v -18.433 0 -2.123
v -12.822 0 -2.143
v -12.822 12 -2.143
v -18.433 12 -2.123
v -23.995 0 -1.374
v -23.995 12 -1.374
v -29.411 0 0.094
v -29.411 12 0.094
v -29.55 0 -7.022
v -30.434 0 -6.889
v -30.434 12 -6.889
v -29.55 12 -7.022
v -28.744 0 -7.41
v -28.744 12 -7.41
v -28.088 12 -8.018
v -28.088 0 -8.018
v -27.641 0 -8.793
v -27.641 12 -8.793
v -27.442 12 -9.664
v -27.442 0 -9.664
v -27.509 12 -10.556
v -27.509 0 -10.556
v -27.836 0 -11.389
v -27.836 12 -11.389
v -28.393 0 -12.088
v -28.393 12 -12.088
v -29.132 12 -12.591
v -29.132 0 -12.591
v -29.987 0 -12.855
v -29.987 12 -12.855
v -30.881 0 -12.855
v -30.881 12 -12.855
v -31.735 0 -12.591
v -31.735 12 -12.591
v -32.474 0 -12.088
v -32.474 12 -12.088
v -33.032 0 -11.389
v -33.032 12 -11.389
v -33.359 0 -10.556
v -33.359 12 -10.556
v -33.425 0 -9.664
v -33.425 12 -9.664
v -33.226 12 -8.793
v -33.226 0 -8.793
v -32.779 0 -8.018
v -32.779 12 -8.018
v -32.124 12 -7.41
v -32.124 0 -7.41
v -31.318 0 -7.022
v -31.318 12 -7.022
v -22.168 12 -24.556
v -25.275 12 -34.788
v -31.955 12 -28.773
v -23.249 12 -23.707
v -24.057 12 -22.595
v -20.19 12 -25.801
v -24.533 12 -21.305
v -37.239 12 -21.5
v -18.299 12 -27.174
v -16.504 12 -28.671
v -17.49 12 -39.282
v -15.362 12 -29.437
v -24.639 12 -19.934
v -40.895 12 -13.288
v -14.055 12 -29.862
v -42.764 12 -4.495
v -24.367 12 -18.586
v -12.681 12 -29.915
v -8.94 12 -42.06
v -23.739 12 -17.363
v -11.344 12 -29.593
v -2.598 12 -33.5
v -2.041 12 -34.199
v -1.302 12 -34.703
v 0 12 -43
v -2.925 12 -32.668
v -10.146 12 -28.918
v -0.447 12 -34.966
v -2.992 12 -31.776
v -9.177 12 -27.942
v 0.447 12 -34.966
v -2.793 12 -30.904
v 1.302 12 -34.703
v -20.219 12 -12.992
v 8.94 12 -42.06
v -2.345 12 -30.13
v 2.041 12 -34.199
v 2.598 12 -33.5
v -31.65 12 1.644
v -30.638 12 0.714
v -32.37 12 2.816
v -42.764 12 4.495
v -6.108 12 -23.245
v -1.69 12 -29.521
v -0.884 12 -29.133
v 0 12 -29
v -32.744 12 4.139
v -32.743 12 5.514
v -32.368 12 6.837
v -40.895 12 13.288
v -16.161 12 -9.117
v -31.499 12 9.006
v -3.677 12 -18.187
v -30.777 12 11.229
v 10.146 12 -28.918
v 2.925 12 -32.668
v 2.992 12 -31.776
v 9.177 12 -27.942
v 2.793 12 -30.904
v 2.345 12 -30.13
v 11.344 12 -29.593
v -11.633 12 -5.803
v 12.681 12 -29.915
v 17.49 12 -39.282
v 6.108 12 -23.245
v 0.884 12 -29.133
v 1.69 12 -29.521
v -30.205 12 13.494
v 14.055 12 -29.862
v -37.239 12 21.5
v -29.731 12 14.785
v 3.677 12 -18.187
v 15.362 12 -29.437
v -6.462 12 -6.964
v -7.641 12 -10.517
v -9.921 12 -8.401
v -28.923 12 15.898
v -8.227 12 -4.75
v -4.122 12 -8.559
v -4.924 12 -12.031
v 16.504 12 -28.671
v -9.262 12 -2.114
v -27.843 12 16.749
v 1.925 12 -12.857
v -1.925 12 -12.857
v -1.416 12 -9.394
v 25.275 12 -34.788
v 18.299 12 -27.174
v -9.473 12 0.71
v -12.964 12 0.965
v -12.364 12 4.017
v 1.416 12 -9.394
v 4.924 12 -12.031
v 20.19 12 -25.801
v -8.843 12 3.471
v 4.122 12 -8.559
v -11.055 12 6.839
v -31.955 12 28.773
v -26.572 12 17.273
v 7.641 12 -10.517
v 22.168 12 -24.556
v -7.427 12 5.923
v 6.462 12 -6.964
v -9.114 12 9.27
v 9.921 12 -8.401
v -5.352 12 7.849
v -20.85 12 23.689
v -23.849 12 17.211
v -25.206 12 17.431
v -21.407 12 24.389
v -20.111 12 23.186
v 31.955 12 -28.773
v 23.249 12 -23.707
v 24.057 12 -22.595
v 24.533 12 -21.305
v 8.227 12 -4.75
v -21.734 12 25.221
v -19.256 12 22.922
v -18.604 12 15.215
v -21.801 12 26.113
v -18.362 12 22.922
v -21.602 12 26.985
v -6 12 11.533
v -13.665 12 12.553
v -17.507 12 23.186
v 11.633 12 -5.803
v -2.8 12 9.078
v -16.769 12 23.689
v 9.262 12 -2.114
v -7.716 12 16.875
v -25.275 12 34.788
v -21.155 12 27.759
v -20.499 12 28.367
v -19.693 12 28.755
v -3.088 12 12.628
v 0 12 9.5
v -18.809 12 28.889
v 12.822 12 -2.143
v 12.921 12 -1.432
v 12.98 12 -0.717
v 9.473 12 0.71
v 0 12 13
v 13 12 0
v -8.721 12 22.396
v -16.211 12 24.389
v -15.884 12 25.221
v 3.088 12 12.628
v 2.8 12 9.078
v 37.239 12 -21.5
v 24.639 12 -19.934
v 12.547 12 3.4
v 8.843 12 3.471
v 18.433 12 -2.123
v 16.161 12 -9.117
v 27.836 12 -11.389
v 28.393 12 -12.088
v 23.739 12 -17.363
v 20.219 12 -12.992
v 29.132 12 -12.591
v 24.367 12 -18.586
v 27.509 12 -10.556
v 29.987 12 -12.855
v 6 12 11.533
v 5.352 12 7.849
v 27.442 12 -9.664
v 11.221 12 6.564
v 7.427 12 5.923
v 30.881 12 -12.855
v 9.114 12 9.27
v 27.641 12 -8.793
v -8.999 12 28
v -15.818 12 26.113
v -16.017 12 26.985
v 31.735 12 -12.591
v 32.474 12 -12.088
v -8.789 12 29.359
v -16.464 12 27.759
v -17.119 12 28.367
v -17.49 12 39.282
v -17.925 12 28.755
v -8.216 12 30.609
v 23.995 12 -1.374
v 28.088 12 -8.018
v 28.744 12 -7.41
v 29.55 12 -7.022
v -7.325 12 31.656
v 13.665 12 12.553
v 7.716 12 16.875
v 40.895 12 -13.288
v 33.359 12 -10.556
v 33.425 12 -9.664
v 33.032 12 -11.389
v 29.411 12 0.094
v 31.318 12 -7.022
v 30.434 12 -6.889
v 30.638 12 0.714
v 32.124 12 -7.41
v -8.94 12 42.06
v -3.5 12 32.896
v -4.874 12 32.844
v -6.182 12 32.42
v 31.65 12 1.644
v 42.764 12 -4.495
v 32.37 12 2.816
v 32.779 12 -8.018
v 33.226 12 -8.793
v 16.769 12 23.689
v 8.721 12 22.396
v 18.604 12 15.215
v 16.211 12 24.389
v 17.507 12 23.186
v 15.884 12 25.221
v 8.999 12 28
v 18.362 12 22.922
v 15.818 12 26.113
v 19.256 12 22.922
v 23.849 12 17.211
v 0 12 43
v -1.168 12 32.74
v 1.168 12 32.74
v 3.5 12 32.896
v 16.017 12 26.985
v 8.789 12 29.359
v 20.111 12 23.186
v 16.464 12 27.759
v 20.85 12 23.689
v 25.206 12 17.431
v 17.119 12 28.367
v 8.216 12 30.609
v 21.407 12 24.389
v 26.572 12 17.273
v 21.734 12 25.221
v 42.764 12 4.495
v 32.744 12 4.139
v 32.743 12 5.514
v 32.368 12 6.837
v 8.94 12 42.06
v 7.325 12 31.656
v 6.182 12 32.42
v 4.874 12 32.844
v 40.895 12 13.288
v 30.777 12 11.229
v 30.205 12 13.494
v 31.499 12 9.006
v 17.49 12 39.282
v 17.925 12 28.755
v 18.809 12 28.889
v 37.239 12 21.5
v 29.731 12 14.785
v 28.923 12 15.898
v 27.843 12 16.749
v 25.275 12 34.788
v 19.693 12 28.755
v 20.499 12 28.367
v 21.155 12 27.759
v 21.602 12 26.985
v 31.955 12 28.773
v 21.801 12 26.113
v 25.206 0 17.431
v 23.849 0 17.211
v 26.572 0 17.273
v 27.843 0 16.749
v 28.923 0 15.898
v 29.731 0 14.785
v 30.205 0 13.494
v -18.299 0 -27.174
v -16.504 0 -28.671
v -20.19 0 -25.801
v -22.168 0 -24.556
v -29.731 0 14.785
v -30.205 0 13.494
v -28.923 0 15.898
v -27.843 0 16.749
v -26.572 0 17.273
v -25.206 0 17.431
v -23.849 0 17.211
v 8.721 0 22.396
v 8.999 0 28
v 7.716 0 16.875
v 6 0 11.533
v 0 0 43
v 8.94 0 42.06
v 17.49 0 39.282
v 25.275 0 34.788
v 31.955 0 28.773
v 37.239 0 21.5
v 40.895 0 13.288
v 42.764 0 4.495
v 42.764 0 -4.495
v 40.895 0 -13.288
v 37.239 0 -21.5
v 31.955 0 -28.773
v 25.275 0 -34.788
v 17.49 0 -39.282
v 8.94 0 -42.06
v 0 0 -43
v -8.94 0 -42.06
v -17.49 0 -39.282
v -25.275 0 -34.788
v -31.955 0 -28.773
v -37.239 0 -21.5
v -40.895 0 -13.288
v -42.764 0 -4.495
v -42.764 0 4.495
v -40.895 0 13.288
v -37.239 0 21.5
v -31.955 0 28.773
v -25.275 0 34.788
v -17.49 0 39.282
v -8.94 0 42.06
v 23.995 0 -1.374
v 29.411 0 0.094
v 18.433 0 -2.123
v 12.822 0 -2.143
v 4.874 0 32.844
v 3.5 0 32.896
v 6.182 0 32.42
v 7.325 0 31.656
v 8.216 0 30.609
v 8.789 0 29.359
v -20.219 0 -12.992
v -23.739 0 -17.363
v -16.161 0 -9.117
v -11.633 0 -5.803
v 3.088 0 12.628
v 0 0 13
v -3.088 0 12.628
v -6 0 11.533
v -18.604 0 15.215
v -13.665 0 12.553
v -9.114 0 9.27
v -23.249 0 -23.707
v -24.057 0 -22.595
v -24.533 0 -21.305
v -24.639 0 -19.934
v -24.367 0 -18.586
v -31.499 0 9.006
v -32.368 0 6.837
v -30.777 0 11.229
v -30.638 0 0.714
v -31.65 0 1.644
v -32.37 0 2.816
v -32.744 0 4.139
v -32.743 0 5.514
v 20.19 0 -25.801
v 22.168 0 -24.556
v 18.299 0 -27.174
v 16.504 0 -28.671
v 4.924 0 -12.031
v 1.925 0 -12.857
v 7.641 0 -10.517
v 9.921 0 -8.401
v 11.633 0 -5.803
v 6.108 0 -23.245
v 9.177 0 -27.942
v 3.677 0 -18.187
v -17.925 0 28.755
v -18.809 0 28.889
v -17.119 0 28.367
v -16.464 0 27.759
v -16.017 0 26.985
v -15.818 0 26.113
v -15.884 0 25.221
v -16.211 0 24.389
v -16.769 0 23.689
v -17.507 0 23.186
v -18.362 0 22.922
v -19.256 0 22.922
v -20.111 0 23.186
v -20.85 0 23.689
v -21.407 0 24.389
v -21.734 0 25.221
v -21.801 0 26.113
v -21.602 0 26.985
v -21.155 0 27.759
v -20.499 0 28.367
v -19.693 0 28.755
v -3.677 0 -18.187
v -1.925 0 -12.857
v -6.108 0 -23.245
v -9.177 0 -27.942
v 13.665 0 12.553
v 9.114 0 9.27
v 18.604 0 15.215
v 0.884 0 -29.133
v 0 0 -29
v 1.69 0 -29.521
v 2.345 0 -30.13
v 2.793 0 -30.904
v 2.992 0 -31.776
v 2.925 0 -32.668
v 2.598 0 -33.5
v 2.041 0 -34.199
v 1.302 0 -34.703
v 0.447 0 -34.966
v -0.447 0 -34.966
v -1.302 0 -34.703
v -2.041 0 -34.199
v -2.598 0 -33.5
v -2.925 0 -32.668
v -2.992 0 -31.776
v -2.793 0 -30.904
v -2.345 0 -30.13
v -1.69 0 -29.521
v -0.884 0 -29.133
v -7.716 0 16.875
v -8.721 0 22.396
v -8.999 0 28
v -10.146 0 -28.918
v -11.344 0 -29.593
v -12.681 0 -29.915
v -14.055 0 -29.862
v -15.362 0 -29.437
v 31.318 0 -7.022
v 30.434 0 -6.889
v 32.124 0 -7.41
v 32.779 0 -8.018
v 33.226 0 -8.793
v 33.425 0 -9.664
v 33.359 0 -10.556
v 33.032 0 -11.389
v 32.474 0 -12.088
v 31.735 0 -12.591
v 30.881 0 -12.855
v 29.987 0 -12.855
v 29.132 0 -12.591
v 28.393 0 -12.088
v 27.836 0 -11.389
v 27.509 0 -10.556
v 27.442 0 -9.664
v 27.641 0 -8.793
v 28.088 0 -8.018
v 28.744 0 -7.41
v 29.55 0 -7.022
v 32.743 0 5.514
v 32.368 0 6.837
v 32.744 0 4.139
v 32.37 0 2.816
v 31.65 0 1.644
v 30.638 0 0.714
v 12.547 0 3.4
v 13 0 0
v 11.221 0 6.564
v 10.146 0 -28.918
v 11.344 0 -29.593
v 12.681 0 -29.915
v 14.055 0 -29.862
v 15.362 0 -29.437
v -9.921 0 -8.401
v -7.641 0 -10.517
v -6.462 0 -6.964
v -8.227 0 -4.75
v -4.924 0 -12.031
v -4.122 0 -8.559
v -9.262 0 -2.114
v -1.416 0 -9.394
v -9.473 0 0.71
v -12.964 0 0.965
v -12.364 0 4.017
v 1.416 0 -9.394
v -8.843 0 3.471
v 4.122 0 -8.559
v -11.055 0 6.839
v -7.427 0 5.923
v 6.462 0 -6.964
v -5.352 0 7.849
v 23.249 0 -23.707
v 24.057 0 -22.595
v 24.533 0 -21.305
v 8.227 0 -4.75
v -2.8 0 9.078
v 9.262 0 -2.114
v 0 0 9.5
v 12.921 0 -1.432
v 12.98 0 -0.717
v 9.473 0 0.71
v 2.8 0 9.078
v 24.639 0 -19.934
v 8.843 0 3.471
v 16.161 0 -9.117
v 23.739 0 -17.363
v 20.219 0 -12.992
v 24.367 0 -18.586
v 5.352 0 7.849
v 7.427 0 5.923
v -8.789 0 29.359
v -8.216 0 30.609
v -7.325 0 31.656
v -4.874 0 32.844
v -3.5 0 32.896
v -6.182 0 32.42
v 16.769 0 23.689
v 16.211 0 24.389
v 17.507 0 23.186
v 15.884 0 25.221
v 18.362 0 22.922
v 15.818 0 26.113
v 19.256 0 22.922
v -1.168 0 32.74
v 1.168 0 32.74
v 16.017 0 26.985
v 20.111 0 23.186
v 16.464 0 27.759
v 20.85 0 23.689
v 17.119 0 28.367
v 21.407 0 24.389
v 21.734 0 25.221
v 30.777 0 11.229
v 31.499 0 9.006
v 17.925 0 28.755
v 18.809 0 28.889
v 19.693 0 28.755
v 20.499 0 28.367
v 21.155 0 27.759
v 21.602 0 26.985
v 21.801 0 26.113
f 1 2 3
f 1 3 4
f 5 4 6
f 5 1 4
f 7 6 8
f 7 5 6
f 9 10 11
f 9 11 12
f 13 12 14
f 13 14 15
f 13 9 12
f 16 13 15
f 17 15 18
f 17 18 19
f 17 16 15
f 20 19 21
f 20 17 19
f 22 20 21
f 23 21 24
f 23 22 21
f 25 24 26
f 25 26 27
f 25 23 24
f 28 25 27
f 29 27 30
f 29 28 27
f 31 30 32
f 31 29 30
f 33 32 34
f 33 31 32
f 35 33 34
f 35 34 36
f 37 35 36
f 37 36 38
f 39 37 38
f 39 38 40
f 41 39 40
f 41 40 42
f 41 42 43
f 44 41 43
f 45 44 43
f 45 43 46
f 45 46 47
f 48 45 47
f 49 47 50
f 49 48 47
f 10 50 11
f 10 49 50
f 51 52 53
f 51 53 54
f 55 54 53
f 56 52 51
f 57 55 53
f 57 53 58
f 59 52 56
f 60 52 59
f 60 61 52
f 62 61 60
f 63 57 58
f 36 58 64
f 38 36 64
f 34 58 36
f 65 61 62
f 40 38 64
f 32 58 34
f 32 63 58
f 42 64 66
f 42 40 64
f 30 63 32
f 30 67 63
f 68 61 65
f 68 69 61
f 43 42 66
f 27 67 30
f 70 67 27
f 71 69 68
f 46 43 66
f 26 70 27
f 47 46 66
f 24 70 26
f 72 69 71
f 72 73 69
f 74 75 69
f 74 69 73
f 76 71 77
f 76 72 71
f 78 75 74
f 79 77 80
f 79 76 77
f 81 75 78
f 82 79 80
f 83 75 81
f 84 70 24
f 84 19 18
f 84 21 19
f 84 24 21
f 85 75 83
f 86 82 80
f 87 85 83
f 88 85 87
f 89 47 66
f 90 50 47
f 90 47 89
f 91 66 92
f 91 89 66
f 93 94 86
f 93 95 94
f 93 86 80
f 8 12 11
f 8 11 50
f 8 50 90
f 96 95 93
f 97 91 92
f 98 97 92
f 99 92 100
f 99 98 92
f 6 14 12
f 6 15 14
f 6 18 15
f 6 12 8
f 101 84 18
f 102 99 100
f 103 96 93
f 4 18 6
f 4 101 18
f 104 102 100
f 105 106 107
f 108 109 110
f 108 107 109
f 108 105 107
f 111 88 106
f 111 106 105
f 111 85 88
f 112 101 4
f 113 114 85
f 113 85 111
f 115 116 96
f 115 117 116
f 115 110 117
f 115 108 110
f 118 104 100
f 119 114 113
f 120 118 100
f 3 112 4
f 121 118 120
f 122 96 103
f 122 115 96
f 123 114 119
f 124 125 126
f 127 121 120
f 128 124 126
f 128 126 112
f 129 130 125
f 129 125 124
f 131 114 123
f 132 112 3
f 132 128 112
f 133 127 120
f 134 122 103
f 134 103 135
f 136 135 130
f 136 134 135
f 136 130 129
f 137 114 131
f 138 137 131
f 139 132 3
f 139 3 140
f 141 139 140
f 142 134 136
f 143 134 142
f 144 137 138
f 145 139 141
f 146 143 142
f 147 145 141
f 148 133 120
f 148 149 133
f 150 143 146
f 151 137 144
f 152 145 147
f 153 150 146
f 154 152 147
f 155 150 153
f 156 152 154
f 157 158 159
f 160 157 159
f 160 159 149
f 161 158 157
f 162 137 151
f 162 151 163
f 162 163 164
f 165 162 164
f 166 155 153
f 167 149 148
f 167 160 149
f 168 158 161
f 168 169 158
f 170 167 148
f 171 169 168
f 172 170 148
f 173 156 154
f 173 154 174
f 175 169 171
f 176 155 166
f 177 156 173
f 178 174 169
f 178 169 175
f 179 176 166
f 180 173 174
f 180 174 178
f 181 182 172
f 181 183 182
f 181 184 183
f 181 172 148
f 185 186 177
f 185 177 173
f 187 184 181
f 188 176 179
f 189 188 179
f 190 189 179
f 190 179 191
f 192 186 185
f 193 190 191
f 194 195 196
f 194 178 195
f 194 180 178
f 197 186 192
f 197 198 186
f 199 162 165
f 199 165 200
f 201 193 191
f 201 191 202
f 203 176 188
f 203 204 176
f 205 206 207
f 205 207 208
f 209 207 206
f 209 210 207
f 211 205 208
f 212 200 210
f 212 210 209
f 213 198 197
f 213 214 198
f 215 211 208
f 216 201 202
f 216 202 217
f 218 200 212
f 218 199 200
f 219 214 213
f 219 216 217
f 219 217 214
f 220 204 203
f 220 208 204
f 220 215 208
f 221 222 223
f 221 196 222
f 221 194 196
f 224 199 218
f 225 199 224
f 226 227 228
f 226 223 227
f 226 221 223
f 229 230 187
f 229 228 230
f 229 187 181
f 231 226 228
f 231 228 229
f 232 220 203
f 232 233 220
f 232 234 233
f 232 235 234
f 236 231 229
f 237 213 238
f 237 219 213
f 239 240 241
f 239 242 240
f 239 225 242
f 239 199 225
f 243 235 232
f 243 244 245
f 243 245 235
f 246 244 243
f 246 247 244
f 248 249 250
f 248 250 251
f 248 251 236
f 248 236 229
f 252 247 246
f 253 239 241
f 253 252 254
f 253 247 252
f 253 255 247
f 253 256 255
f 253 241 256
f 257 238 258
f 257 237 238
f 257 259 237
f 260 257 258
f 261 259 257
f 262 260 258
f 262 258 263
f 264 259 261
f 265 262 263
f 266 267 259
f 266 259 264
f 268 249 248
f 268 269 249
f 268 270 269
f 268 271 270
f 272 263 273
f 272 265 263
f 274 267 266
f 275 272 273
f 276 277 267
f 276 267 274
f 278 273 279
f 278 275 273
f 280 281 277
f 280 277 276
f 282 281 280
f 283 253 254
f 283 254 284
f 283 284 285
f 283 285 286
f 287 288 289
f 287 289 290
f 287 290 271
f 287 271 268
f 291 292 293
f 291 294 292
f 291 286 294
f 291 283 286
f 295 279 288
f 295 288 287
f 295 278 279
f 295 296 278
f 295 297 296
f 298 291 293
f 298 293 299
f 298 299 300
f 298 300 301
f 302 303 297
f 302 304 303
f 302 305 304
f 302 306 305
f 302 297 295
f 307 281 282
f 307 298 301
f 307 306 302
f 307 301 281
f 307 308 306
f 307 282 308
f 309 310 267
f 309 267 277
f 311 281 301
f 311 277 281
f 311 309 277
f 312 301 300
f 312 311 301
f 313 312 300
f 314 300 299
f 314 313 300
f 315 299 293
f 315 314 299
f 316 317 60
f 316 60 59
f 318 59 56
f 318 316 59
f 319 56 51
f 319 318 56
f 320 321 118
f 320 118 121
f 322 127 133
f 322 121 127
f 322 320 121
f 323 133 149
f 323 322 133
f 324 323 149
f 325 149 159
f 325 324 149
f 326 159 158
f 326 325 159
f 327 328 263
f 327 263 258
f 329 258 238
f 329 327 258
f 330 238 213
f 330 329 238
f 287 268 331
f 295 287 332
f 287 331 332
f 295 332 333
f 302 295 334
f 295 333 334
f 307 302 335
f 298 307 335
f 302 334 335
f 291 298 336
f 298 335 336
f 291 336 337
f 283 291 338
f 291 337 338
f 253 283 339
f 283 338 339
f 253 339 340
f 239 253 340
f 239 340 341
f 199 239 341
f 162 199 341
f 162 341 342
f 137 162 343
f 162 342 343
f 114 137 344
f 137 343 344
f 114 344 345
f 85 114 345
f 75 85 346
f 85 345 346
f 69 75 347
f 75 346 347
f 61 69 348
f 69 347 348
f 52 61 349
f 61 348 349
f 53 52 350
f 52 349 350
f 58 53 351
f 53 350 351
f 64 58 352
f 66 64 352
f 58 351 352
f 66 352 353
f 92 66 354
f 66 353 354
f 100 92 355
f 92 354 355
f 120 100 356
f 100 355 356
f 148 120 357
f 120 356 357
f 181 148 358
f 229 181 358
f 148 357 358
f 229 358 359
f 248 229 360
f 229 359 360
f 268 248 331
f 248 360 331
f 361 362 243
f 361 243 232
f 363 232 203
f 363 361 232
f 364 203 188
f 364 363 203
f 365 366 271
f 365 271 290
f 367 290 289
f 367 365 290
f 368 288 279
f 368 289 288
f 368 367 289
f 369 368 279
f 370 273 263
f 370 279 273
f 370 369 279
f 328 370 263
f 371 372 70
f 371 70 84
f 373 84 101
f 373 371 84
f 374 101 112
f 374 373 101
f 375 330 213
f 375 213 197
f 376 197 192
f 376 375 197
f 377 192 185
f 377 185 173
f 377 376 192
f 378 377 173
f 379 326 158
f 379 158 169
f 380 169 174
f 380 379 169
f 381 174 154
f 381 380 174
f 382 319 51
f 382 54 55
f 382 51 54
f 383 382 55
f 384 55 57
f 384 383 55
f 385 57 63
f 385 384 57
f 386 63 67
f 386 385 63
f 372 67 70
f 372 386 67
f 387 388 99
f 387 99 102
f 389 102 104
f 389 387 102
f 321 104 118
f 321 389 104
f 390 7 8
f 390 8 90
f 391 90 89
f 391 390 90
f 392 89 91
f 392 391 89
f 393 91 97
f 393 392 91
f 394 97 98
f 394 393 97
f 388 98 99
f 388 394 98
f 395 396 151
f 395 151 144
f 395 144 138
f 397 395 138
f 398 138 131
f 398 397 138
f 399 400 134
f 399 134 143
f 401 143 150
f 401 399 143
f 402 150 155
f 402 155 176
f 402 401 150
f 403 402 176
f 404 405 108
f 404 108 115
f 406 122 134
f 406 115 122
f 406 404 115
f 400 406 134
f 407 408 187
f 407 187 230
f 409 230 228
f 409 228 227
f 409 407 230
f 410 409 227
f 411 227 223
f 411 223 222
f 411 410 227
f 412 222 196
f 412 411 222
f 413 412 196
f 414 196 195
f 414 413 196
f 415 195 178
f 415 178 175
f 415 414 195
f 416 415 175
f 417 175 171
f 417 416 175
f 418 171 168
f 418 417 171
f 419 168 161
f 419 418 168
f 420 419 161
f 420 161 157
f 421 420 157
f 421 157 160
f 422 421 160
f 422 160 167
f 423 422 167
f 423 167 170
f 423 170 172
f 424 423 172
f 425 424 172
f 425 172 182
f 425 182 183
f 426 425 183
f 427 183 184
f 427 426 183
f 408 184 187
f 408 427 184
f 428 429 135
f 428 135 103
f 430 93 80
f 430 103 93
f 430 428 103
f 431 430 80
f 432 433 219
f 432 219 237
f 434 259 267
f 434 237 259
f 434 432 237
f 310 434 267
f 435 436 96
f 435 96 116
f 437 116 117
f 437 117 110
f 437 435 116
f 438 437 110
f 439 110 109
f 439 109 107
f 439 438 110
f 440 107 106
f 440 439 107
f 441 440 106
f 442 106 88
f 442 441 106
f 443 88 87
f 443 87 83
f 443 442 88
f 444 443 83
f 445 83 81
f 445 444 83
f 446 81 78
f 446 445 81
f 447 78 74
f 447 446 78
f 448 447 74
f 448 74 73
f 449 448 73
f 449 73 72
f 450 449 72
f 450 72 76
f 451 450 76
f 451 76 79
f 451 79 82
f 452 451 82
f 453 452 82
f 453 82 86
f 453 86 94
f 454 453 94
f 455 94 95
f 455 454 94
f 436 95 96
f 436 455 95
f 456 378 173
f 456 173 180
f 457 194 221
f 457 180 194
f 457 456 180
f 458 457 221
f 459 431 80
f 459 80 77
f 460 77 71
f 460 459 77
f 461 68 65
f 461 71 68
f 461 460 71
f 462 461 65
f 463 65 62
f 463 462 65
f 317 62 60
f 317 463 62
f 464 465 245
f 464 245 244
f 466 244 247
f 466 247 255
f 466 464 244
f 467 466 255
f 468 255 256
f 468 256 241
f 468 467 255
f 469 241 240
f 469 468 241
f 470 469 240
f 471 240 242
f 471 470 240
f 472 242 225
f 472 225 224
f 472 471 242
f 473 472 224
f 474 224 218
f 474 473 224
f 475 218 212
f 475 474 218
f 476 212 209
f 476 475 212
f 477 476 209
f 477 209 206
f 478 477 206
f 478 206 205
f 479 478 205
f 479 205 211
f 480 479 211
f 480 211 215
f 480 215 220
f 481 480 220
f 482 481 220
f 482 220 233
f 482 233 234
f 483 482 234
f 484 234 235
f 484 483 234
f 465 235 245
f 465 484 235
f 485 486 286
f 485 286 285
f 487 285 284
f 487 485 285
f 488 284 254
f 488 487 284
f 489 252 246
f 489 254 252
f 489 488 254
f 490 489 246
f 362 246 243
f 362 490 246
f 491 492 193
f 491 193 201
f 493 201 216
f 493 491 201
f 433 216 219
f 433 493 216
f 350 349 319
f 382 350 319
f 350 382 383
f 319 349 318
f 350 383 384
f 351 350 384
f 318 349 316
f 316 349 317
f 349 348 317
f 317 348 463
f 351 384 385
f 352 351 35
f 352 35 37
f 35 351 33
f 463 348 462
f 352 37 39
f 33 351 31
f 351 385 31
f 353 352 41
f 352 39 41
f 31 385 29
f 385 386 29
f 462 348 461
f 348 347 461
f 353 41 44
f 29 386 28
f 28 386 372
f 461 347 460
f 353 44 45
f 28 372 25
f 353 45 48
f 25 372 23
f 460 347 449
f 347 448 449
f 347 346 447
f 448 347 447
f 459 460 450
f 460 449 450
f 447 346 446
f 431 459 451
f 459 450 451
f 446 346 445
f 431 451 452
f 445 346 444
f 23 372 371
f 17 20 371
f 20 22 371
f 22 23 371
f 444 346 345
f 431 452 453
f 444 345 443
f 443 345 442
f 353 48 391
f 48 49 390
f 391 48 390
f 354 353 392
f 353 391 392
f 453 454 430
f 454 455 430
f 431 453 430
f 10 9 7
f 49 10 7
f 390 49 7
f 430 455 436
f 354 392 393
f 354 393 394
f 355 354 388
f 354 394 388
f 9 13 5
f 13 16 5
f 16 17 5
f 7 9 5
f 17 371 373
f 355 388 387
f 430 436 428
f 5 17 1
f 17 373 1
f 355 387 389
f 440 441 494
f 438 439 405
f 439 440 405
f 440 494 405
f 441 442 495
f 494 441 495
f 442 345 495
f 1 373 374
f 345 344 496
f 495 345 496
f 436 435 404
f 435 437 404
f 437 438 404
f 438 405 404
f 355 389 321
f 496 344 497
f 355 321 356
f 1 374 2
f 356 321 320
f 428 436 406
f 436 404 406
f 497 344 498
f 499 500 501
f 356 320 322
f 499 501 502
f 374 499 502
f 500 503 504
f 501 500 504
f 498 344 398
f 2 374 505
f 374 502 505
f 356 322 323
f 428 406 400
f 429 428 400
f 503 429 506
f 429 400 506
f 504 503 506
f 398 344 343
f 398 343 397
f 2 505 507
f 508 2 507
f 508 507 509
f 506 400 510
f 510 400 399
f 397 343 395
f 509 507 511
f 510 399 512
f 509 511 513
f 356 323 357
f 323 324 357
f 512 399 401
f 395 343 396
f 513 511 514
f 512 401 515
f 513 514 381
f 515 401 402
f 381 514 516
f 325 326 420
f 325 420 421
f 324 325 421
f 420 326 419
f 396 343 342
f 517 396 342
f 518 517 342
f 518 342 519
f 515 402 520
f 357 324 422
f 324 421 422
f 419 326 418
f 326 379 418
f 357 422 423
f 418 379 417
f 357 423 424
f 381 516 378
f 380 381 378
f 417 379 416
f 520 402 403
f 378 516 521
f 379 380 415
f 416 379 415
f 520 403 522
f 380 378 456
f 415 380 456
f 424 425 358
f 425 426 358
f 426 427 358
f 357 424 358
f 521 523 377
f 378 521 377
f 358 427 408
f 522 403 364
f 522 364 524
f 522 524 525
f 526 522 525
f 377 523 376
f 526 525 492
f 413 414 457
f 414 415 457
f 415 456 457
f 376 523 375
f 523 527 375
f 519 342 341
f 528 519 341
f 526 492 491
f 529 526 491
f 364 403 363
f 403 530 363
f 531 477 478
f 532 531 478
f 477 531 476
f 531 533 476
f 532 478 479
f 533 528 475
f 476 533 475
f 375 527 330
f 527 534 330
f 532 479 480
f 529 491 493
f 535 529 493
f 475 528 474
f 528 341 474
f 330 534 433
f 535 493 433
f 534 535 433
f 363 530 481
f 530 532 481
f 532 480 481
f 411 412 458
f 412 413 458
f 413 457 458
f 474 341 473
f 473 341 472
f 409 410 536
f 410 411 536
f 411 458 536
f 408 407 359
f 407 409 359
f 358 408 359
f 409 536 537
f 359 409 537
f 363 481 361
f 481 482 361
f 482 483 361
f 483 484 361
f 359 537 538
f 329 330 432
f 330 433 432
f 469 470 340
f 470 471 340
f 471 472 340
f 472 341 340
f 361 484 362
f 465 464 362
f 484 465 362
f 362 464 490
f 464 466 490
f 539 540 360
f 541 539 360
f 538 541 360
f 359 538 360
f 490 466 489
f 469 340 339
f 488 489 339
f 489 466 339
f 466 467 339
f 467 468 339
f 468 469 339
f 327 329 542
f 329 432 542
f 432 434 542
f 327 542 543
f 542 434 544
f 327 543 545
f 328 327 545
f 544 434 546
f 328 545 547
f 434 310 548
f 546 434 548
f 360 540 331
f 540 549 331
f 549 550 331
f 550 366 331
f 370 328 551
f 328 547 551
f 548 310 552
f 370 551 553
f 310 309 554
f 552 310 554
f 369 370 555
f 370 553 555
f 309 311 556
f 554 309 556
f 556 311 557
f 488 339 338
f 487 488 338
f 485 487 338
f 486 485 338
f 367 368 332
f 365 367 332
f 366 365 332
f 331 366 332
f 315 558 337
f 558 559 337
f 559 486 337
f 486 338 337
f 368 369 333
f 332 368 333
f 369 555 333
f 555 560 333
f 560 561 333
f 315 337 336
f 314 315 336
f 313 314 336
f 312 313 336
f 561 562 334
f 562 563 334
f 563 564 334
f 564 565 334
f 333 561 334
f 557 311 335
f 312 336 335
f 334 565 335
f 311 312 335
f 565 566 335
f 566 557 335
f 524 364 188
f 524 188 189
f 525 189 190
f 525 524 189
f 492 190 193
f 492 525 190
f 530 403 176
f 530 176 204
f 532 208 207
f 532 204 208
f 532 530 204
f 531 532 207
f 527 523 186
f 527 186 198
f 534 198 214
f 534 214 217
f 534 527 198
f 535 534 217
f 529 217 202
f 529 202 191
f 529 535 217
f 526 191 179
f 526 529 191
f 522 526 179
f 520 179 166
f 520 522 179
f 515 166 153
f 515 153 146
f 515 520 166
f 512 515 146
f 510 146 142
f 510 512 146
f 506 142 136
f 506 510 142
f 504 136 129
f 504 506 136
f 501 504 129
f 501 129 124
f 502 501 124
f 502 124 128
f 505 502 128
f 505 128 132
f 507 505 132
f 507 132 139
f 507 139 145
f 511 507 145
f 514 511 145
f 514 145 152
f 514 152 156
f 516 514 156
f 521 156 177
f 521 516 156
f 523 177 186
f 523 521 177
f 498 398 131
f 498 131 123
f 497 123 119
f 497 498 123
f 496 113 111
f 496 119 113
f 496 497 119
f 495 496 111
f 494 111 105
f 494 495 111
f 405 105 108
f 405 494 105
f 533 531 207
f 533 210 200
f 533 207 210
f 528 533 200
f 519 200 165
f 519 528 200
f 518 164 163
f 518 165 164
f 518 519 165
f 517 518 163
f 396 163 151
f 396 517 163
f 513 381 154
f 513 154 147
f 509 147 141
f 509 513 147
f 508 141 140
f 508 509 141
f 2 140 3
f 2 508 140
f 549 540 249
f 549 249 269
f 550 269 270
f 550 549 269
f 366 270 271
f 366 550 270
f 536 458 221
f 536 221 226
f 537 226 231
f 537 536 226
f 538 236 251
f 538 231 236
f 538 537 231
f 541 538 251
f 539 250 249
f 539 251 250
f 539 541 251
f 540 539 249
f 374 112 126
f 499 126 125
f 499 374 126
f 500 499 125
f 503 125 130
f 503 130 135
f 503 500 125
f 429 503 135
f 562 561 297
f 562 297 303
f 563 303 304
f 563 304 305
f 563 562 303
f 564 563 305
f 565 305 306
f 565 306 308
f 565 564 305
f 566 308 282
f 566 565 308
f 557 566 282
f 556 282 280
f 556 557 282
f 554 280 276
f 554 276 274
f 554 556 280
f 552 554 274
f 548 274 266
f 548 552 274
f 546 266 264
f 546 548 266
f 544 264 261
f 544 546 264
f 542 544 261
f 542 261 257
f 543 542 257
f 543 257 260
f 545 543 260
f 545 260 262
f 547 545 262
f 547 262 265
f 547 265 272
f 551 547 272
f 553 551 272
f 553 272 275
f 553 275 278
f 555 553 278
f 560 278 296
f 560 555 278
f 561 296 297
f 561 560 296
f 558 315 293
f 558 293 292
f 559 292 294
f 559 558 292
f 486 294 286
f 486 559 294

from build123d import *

# Parameters (mm, degrees)
SKETCH_1_R               = 43
SKETCH_1_R_2             = 9.5
SKETCH_1_R_3             = 3
EXTRUDE_1_DEPTH          = 12
CUT_EXTRUDE_1_DEPTH      = 62.983868869
CUT_EXTRUDE_1_DEPTH_BACK = 62.983868869


with BuildPart() as part:
    # 草图1 → 凸台-拉伸1 (new body)
    with BuildSketch(Plane(origin=(0, 0, 0), x_dir=(1, 0, 0), z_dir=(0, 1, 0))):
        with Locations(Location((0, 0, 0), (0, 0, 270))):
            Circle(SKETCH_1_R)
        with Locations(Location((0, 0, 0), (0, 0, 270))):
            Circle(SKETCH_1_R_2, mode=Mode.SUBTRACT)
        with Locations(Location((0, 32, 0), (0, 0, 270))):
            Circle(SKETCH_1_R_3, mode=Mode.SUBTRACT)
        with Locations(Location((30.433808521, 9.88854382, 0), (0, 0, 270))):
            Circle(SKETCH_1_R_3, mode=Mode.SUBTRACT)
        with Locations(Location((18.809128073, -25.88854382, 0), (0, 0, 270))):
            Circle(SKETCH_1_R_3, mode=Mode.SUBTRACT)
        with Locations(Location((-18.809128073, -25.88854382, 0), (0, 0, 270))):
            Circle(SKETCH_1_R_3, mode=Mode.SUBTRACT)
        with Locations(Location((-30.433808521, 9.88854382, 0), (0, 0, 270))):
            Circle(SKETCH_1_R_3, mode=Mode.SUBTRACT)
    extrude(amount=EXTRUDE_1_DEPTH)

    # 草图2 → 切除-拉伸1 (cut, two sides: drawn at the far end of the back side and taken through both)
    with BuildSketch(Plane(origin=(0, 0, 0), x_dir=(1, 0, 0), z_dir=(0, 1, 0)).offset(-CUT_EXTRUDE_1_DEPTH_BACK)):
        with BuildLine():
            ThreePointArc((-23.848620344, -17.211397152), (-16.091180112, -13.964625454), (-9.114016839, -9.270096928))
            ThreePointArc((-9.114016839, -9.270096928), (-12.363734712, -4.017220927), (-12.822220771, 2.142581267))
            ThreePointArc((-12.822220771, 2.142581267), (-21.226239066, 1.839460951), (-29.410544568, -0.093554533))
            ThreePointArc((-29.410544568, -0.093554533), (-32.369922784, -2.815813731), (-32.36785177, -6.83683478))
            ThreePointArc((-32.36785177, -6.83683478), (-31.119439219, -10.111318738), (-30.204732809, -13.494230394))
            ThreePointArc((-30.204732809, -13.494230394), (-27.842911423, -16.748522069), (-23.848620344, -17.211397152))
        make_face()
        with BuildLine():
            ThreePointArc((8.999382438, -28), (8.308699922, -19.618928286), (6, -11.532562595))
            ThreePointArc((6, -11.532562595), (0, -13), (-6, -11.532562595))
            ThreePointArc((-6, -11.532562595), (-8.308699922, -19.618928286), (-8.999382438, -28))
            ThreePointArc((-8.999382438, -28), (-7.324858249, -31.655760291), (-3.5, -32.896354479))
            ThreePointArc((-3.5, -32.896354479), (0, -32.720914778), (3.5, -32.896354479))
            ThreePointArc((3.5, -32.896354479), (7.324858249, -31.655760291), (8.999382438, -28))
        make_face()
        with BuildLine():
            ThreePointArc((12.822220771, 2.142581267), (12.955478957, 1.074972086), (13, 0))
            ThreePointArc((13, 0), (11.989208041, -5.025822375), (9.114016839, -9.270096928))
            ThreePointArc((9.114016839, -9.270096928), (16.091180112, -13.964625454), (23.848620344, -17.211397152))
            ThreePointArc((23.848620344, -17.211397152), (27.842911423, -16.748522069), (30.204732809, -13.494230394))
            ThreePointArc((30.204732809, -13.494230394), (31.119439219, -10.111318738), (32.36785177, -6.83683478))
            ThreePointArc((32.36785177, -6.83683478), (32.369922784, -2.815813731), (29.410544568, -0.093554533))
            ThreePointArc((29.410544568, -0.093554533), (21.226239066, 1.839460951), (12.822220771, 2.142581267))
        make_face()
        with BuildLine():
            ThreePointArc((1.924568248, 12.856750642), (7.64120828, 10.517220927), (11.632772181, 5.803327614))
            ThreePointArc((11.632772181, 5.803327614), (18.25359615, 10.988315115), (23.738640395, 17.362771566))
            ThreePointArc((23.738640395, 17.362771566), (24.532723854, 21.304604391), (22.167551497, 24.556461444))
            ThreePointArc((22.167551497, 24.556461444), (19.232871148, 26.471776127), (16.504432537, 28.67095821))
            ThreePointArc((16.504432537, 28.67095821), (12.680854244, 29.915491699), (9.177333733, 27.942180119))
            ThreePointArc((9.177333733, 27.942180119), (4.809837274, 20.755777674), (1.924568248, 12.856750642))
        make_face()
        with BuildLine():
            ThreePointArc((-11.632772181, 5.803327614), (-7.64120828, 10.517220927), (-1.924568248, 12.856750642))
            ThreePointArc((-1.924568248, 12.856750642), (-4.809837274, 20.755777674), (-9.177333733, 27.942180119))
            ThreePointArc((-9.177333733, 27.942180119), (-12.680854244, 29.915491699), (-16.504432537, 28.67095821))
            ThreePointArc((-16.504432537, 28.67095821), (-19.232871148, 26.471776127), (-22.167551497, 24.556461444))
            ThreePointArc((-22.167551497, 24.556461444), (-24.532723854, 21.304604391), (-23.738640395, 17.362771566))
            ThreePointArc((-23.738640395, 17.362771566), (-18.25359615, 10.988315115), (-11.632772181, 5.803327614))
        make_face()
    extrude(amount=CUT_EXTRUDE_1_DEPTH + CUT_EXTRUDE_1_DEPTH_BACK, mode=Mode.SUBTRACT)


solid = part.part
